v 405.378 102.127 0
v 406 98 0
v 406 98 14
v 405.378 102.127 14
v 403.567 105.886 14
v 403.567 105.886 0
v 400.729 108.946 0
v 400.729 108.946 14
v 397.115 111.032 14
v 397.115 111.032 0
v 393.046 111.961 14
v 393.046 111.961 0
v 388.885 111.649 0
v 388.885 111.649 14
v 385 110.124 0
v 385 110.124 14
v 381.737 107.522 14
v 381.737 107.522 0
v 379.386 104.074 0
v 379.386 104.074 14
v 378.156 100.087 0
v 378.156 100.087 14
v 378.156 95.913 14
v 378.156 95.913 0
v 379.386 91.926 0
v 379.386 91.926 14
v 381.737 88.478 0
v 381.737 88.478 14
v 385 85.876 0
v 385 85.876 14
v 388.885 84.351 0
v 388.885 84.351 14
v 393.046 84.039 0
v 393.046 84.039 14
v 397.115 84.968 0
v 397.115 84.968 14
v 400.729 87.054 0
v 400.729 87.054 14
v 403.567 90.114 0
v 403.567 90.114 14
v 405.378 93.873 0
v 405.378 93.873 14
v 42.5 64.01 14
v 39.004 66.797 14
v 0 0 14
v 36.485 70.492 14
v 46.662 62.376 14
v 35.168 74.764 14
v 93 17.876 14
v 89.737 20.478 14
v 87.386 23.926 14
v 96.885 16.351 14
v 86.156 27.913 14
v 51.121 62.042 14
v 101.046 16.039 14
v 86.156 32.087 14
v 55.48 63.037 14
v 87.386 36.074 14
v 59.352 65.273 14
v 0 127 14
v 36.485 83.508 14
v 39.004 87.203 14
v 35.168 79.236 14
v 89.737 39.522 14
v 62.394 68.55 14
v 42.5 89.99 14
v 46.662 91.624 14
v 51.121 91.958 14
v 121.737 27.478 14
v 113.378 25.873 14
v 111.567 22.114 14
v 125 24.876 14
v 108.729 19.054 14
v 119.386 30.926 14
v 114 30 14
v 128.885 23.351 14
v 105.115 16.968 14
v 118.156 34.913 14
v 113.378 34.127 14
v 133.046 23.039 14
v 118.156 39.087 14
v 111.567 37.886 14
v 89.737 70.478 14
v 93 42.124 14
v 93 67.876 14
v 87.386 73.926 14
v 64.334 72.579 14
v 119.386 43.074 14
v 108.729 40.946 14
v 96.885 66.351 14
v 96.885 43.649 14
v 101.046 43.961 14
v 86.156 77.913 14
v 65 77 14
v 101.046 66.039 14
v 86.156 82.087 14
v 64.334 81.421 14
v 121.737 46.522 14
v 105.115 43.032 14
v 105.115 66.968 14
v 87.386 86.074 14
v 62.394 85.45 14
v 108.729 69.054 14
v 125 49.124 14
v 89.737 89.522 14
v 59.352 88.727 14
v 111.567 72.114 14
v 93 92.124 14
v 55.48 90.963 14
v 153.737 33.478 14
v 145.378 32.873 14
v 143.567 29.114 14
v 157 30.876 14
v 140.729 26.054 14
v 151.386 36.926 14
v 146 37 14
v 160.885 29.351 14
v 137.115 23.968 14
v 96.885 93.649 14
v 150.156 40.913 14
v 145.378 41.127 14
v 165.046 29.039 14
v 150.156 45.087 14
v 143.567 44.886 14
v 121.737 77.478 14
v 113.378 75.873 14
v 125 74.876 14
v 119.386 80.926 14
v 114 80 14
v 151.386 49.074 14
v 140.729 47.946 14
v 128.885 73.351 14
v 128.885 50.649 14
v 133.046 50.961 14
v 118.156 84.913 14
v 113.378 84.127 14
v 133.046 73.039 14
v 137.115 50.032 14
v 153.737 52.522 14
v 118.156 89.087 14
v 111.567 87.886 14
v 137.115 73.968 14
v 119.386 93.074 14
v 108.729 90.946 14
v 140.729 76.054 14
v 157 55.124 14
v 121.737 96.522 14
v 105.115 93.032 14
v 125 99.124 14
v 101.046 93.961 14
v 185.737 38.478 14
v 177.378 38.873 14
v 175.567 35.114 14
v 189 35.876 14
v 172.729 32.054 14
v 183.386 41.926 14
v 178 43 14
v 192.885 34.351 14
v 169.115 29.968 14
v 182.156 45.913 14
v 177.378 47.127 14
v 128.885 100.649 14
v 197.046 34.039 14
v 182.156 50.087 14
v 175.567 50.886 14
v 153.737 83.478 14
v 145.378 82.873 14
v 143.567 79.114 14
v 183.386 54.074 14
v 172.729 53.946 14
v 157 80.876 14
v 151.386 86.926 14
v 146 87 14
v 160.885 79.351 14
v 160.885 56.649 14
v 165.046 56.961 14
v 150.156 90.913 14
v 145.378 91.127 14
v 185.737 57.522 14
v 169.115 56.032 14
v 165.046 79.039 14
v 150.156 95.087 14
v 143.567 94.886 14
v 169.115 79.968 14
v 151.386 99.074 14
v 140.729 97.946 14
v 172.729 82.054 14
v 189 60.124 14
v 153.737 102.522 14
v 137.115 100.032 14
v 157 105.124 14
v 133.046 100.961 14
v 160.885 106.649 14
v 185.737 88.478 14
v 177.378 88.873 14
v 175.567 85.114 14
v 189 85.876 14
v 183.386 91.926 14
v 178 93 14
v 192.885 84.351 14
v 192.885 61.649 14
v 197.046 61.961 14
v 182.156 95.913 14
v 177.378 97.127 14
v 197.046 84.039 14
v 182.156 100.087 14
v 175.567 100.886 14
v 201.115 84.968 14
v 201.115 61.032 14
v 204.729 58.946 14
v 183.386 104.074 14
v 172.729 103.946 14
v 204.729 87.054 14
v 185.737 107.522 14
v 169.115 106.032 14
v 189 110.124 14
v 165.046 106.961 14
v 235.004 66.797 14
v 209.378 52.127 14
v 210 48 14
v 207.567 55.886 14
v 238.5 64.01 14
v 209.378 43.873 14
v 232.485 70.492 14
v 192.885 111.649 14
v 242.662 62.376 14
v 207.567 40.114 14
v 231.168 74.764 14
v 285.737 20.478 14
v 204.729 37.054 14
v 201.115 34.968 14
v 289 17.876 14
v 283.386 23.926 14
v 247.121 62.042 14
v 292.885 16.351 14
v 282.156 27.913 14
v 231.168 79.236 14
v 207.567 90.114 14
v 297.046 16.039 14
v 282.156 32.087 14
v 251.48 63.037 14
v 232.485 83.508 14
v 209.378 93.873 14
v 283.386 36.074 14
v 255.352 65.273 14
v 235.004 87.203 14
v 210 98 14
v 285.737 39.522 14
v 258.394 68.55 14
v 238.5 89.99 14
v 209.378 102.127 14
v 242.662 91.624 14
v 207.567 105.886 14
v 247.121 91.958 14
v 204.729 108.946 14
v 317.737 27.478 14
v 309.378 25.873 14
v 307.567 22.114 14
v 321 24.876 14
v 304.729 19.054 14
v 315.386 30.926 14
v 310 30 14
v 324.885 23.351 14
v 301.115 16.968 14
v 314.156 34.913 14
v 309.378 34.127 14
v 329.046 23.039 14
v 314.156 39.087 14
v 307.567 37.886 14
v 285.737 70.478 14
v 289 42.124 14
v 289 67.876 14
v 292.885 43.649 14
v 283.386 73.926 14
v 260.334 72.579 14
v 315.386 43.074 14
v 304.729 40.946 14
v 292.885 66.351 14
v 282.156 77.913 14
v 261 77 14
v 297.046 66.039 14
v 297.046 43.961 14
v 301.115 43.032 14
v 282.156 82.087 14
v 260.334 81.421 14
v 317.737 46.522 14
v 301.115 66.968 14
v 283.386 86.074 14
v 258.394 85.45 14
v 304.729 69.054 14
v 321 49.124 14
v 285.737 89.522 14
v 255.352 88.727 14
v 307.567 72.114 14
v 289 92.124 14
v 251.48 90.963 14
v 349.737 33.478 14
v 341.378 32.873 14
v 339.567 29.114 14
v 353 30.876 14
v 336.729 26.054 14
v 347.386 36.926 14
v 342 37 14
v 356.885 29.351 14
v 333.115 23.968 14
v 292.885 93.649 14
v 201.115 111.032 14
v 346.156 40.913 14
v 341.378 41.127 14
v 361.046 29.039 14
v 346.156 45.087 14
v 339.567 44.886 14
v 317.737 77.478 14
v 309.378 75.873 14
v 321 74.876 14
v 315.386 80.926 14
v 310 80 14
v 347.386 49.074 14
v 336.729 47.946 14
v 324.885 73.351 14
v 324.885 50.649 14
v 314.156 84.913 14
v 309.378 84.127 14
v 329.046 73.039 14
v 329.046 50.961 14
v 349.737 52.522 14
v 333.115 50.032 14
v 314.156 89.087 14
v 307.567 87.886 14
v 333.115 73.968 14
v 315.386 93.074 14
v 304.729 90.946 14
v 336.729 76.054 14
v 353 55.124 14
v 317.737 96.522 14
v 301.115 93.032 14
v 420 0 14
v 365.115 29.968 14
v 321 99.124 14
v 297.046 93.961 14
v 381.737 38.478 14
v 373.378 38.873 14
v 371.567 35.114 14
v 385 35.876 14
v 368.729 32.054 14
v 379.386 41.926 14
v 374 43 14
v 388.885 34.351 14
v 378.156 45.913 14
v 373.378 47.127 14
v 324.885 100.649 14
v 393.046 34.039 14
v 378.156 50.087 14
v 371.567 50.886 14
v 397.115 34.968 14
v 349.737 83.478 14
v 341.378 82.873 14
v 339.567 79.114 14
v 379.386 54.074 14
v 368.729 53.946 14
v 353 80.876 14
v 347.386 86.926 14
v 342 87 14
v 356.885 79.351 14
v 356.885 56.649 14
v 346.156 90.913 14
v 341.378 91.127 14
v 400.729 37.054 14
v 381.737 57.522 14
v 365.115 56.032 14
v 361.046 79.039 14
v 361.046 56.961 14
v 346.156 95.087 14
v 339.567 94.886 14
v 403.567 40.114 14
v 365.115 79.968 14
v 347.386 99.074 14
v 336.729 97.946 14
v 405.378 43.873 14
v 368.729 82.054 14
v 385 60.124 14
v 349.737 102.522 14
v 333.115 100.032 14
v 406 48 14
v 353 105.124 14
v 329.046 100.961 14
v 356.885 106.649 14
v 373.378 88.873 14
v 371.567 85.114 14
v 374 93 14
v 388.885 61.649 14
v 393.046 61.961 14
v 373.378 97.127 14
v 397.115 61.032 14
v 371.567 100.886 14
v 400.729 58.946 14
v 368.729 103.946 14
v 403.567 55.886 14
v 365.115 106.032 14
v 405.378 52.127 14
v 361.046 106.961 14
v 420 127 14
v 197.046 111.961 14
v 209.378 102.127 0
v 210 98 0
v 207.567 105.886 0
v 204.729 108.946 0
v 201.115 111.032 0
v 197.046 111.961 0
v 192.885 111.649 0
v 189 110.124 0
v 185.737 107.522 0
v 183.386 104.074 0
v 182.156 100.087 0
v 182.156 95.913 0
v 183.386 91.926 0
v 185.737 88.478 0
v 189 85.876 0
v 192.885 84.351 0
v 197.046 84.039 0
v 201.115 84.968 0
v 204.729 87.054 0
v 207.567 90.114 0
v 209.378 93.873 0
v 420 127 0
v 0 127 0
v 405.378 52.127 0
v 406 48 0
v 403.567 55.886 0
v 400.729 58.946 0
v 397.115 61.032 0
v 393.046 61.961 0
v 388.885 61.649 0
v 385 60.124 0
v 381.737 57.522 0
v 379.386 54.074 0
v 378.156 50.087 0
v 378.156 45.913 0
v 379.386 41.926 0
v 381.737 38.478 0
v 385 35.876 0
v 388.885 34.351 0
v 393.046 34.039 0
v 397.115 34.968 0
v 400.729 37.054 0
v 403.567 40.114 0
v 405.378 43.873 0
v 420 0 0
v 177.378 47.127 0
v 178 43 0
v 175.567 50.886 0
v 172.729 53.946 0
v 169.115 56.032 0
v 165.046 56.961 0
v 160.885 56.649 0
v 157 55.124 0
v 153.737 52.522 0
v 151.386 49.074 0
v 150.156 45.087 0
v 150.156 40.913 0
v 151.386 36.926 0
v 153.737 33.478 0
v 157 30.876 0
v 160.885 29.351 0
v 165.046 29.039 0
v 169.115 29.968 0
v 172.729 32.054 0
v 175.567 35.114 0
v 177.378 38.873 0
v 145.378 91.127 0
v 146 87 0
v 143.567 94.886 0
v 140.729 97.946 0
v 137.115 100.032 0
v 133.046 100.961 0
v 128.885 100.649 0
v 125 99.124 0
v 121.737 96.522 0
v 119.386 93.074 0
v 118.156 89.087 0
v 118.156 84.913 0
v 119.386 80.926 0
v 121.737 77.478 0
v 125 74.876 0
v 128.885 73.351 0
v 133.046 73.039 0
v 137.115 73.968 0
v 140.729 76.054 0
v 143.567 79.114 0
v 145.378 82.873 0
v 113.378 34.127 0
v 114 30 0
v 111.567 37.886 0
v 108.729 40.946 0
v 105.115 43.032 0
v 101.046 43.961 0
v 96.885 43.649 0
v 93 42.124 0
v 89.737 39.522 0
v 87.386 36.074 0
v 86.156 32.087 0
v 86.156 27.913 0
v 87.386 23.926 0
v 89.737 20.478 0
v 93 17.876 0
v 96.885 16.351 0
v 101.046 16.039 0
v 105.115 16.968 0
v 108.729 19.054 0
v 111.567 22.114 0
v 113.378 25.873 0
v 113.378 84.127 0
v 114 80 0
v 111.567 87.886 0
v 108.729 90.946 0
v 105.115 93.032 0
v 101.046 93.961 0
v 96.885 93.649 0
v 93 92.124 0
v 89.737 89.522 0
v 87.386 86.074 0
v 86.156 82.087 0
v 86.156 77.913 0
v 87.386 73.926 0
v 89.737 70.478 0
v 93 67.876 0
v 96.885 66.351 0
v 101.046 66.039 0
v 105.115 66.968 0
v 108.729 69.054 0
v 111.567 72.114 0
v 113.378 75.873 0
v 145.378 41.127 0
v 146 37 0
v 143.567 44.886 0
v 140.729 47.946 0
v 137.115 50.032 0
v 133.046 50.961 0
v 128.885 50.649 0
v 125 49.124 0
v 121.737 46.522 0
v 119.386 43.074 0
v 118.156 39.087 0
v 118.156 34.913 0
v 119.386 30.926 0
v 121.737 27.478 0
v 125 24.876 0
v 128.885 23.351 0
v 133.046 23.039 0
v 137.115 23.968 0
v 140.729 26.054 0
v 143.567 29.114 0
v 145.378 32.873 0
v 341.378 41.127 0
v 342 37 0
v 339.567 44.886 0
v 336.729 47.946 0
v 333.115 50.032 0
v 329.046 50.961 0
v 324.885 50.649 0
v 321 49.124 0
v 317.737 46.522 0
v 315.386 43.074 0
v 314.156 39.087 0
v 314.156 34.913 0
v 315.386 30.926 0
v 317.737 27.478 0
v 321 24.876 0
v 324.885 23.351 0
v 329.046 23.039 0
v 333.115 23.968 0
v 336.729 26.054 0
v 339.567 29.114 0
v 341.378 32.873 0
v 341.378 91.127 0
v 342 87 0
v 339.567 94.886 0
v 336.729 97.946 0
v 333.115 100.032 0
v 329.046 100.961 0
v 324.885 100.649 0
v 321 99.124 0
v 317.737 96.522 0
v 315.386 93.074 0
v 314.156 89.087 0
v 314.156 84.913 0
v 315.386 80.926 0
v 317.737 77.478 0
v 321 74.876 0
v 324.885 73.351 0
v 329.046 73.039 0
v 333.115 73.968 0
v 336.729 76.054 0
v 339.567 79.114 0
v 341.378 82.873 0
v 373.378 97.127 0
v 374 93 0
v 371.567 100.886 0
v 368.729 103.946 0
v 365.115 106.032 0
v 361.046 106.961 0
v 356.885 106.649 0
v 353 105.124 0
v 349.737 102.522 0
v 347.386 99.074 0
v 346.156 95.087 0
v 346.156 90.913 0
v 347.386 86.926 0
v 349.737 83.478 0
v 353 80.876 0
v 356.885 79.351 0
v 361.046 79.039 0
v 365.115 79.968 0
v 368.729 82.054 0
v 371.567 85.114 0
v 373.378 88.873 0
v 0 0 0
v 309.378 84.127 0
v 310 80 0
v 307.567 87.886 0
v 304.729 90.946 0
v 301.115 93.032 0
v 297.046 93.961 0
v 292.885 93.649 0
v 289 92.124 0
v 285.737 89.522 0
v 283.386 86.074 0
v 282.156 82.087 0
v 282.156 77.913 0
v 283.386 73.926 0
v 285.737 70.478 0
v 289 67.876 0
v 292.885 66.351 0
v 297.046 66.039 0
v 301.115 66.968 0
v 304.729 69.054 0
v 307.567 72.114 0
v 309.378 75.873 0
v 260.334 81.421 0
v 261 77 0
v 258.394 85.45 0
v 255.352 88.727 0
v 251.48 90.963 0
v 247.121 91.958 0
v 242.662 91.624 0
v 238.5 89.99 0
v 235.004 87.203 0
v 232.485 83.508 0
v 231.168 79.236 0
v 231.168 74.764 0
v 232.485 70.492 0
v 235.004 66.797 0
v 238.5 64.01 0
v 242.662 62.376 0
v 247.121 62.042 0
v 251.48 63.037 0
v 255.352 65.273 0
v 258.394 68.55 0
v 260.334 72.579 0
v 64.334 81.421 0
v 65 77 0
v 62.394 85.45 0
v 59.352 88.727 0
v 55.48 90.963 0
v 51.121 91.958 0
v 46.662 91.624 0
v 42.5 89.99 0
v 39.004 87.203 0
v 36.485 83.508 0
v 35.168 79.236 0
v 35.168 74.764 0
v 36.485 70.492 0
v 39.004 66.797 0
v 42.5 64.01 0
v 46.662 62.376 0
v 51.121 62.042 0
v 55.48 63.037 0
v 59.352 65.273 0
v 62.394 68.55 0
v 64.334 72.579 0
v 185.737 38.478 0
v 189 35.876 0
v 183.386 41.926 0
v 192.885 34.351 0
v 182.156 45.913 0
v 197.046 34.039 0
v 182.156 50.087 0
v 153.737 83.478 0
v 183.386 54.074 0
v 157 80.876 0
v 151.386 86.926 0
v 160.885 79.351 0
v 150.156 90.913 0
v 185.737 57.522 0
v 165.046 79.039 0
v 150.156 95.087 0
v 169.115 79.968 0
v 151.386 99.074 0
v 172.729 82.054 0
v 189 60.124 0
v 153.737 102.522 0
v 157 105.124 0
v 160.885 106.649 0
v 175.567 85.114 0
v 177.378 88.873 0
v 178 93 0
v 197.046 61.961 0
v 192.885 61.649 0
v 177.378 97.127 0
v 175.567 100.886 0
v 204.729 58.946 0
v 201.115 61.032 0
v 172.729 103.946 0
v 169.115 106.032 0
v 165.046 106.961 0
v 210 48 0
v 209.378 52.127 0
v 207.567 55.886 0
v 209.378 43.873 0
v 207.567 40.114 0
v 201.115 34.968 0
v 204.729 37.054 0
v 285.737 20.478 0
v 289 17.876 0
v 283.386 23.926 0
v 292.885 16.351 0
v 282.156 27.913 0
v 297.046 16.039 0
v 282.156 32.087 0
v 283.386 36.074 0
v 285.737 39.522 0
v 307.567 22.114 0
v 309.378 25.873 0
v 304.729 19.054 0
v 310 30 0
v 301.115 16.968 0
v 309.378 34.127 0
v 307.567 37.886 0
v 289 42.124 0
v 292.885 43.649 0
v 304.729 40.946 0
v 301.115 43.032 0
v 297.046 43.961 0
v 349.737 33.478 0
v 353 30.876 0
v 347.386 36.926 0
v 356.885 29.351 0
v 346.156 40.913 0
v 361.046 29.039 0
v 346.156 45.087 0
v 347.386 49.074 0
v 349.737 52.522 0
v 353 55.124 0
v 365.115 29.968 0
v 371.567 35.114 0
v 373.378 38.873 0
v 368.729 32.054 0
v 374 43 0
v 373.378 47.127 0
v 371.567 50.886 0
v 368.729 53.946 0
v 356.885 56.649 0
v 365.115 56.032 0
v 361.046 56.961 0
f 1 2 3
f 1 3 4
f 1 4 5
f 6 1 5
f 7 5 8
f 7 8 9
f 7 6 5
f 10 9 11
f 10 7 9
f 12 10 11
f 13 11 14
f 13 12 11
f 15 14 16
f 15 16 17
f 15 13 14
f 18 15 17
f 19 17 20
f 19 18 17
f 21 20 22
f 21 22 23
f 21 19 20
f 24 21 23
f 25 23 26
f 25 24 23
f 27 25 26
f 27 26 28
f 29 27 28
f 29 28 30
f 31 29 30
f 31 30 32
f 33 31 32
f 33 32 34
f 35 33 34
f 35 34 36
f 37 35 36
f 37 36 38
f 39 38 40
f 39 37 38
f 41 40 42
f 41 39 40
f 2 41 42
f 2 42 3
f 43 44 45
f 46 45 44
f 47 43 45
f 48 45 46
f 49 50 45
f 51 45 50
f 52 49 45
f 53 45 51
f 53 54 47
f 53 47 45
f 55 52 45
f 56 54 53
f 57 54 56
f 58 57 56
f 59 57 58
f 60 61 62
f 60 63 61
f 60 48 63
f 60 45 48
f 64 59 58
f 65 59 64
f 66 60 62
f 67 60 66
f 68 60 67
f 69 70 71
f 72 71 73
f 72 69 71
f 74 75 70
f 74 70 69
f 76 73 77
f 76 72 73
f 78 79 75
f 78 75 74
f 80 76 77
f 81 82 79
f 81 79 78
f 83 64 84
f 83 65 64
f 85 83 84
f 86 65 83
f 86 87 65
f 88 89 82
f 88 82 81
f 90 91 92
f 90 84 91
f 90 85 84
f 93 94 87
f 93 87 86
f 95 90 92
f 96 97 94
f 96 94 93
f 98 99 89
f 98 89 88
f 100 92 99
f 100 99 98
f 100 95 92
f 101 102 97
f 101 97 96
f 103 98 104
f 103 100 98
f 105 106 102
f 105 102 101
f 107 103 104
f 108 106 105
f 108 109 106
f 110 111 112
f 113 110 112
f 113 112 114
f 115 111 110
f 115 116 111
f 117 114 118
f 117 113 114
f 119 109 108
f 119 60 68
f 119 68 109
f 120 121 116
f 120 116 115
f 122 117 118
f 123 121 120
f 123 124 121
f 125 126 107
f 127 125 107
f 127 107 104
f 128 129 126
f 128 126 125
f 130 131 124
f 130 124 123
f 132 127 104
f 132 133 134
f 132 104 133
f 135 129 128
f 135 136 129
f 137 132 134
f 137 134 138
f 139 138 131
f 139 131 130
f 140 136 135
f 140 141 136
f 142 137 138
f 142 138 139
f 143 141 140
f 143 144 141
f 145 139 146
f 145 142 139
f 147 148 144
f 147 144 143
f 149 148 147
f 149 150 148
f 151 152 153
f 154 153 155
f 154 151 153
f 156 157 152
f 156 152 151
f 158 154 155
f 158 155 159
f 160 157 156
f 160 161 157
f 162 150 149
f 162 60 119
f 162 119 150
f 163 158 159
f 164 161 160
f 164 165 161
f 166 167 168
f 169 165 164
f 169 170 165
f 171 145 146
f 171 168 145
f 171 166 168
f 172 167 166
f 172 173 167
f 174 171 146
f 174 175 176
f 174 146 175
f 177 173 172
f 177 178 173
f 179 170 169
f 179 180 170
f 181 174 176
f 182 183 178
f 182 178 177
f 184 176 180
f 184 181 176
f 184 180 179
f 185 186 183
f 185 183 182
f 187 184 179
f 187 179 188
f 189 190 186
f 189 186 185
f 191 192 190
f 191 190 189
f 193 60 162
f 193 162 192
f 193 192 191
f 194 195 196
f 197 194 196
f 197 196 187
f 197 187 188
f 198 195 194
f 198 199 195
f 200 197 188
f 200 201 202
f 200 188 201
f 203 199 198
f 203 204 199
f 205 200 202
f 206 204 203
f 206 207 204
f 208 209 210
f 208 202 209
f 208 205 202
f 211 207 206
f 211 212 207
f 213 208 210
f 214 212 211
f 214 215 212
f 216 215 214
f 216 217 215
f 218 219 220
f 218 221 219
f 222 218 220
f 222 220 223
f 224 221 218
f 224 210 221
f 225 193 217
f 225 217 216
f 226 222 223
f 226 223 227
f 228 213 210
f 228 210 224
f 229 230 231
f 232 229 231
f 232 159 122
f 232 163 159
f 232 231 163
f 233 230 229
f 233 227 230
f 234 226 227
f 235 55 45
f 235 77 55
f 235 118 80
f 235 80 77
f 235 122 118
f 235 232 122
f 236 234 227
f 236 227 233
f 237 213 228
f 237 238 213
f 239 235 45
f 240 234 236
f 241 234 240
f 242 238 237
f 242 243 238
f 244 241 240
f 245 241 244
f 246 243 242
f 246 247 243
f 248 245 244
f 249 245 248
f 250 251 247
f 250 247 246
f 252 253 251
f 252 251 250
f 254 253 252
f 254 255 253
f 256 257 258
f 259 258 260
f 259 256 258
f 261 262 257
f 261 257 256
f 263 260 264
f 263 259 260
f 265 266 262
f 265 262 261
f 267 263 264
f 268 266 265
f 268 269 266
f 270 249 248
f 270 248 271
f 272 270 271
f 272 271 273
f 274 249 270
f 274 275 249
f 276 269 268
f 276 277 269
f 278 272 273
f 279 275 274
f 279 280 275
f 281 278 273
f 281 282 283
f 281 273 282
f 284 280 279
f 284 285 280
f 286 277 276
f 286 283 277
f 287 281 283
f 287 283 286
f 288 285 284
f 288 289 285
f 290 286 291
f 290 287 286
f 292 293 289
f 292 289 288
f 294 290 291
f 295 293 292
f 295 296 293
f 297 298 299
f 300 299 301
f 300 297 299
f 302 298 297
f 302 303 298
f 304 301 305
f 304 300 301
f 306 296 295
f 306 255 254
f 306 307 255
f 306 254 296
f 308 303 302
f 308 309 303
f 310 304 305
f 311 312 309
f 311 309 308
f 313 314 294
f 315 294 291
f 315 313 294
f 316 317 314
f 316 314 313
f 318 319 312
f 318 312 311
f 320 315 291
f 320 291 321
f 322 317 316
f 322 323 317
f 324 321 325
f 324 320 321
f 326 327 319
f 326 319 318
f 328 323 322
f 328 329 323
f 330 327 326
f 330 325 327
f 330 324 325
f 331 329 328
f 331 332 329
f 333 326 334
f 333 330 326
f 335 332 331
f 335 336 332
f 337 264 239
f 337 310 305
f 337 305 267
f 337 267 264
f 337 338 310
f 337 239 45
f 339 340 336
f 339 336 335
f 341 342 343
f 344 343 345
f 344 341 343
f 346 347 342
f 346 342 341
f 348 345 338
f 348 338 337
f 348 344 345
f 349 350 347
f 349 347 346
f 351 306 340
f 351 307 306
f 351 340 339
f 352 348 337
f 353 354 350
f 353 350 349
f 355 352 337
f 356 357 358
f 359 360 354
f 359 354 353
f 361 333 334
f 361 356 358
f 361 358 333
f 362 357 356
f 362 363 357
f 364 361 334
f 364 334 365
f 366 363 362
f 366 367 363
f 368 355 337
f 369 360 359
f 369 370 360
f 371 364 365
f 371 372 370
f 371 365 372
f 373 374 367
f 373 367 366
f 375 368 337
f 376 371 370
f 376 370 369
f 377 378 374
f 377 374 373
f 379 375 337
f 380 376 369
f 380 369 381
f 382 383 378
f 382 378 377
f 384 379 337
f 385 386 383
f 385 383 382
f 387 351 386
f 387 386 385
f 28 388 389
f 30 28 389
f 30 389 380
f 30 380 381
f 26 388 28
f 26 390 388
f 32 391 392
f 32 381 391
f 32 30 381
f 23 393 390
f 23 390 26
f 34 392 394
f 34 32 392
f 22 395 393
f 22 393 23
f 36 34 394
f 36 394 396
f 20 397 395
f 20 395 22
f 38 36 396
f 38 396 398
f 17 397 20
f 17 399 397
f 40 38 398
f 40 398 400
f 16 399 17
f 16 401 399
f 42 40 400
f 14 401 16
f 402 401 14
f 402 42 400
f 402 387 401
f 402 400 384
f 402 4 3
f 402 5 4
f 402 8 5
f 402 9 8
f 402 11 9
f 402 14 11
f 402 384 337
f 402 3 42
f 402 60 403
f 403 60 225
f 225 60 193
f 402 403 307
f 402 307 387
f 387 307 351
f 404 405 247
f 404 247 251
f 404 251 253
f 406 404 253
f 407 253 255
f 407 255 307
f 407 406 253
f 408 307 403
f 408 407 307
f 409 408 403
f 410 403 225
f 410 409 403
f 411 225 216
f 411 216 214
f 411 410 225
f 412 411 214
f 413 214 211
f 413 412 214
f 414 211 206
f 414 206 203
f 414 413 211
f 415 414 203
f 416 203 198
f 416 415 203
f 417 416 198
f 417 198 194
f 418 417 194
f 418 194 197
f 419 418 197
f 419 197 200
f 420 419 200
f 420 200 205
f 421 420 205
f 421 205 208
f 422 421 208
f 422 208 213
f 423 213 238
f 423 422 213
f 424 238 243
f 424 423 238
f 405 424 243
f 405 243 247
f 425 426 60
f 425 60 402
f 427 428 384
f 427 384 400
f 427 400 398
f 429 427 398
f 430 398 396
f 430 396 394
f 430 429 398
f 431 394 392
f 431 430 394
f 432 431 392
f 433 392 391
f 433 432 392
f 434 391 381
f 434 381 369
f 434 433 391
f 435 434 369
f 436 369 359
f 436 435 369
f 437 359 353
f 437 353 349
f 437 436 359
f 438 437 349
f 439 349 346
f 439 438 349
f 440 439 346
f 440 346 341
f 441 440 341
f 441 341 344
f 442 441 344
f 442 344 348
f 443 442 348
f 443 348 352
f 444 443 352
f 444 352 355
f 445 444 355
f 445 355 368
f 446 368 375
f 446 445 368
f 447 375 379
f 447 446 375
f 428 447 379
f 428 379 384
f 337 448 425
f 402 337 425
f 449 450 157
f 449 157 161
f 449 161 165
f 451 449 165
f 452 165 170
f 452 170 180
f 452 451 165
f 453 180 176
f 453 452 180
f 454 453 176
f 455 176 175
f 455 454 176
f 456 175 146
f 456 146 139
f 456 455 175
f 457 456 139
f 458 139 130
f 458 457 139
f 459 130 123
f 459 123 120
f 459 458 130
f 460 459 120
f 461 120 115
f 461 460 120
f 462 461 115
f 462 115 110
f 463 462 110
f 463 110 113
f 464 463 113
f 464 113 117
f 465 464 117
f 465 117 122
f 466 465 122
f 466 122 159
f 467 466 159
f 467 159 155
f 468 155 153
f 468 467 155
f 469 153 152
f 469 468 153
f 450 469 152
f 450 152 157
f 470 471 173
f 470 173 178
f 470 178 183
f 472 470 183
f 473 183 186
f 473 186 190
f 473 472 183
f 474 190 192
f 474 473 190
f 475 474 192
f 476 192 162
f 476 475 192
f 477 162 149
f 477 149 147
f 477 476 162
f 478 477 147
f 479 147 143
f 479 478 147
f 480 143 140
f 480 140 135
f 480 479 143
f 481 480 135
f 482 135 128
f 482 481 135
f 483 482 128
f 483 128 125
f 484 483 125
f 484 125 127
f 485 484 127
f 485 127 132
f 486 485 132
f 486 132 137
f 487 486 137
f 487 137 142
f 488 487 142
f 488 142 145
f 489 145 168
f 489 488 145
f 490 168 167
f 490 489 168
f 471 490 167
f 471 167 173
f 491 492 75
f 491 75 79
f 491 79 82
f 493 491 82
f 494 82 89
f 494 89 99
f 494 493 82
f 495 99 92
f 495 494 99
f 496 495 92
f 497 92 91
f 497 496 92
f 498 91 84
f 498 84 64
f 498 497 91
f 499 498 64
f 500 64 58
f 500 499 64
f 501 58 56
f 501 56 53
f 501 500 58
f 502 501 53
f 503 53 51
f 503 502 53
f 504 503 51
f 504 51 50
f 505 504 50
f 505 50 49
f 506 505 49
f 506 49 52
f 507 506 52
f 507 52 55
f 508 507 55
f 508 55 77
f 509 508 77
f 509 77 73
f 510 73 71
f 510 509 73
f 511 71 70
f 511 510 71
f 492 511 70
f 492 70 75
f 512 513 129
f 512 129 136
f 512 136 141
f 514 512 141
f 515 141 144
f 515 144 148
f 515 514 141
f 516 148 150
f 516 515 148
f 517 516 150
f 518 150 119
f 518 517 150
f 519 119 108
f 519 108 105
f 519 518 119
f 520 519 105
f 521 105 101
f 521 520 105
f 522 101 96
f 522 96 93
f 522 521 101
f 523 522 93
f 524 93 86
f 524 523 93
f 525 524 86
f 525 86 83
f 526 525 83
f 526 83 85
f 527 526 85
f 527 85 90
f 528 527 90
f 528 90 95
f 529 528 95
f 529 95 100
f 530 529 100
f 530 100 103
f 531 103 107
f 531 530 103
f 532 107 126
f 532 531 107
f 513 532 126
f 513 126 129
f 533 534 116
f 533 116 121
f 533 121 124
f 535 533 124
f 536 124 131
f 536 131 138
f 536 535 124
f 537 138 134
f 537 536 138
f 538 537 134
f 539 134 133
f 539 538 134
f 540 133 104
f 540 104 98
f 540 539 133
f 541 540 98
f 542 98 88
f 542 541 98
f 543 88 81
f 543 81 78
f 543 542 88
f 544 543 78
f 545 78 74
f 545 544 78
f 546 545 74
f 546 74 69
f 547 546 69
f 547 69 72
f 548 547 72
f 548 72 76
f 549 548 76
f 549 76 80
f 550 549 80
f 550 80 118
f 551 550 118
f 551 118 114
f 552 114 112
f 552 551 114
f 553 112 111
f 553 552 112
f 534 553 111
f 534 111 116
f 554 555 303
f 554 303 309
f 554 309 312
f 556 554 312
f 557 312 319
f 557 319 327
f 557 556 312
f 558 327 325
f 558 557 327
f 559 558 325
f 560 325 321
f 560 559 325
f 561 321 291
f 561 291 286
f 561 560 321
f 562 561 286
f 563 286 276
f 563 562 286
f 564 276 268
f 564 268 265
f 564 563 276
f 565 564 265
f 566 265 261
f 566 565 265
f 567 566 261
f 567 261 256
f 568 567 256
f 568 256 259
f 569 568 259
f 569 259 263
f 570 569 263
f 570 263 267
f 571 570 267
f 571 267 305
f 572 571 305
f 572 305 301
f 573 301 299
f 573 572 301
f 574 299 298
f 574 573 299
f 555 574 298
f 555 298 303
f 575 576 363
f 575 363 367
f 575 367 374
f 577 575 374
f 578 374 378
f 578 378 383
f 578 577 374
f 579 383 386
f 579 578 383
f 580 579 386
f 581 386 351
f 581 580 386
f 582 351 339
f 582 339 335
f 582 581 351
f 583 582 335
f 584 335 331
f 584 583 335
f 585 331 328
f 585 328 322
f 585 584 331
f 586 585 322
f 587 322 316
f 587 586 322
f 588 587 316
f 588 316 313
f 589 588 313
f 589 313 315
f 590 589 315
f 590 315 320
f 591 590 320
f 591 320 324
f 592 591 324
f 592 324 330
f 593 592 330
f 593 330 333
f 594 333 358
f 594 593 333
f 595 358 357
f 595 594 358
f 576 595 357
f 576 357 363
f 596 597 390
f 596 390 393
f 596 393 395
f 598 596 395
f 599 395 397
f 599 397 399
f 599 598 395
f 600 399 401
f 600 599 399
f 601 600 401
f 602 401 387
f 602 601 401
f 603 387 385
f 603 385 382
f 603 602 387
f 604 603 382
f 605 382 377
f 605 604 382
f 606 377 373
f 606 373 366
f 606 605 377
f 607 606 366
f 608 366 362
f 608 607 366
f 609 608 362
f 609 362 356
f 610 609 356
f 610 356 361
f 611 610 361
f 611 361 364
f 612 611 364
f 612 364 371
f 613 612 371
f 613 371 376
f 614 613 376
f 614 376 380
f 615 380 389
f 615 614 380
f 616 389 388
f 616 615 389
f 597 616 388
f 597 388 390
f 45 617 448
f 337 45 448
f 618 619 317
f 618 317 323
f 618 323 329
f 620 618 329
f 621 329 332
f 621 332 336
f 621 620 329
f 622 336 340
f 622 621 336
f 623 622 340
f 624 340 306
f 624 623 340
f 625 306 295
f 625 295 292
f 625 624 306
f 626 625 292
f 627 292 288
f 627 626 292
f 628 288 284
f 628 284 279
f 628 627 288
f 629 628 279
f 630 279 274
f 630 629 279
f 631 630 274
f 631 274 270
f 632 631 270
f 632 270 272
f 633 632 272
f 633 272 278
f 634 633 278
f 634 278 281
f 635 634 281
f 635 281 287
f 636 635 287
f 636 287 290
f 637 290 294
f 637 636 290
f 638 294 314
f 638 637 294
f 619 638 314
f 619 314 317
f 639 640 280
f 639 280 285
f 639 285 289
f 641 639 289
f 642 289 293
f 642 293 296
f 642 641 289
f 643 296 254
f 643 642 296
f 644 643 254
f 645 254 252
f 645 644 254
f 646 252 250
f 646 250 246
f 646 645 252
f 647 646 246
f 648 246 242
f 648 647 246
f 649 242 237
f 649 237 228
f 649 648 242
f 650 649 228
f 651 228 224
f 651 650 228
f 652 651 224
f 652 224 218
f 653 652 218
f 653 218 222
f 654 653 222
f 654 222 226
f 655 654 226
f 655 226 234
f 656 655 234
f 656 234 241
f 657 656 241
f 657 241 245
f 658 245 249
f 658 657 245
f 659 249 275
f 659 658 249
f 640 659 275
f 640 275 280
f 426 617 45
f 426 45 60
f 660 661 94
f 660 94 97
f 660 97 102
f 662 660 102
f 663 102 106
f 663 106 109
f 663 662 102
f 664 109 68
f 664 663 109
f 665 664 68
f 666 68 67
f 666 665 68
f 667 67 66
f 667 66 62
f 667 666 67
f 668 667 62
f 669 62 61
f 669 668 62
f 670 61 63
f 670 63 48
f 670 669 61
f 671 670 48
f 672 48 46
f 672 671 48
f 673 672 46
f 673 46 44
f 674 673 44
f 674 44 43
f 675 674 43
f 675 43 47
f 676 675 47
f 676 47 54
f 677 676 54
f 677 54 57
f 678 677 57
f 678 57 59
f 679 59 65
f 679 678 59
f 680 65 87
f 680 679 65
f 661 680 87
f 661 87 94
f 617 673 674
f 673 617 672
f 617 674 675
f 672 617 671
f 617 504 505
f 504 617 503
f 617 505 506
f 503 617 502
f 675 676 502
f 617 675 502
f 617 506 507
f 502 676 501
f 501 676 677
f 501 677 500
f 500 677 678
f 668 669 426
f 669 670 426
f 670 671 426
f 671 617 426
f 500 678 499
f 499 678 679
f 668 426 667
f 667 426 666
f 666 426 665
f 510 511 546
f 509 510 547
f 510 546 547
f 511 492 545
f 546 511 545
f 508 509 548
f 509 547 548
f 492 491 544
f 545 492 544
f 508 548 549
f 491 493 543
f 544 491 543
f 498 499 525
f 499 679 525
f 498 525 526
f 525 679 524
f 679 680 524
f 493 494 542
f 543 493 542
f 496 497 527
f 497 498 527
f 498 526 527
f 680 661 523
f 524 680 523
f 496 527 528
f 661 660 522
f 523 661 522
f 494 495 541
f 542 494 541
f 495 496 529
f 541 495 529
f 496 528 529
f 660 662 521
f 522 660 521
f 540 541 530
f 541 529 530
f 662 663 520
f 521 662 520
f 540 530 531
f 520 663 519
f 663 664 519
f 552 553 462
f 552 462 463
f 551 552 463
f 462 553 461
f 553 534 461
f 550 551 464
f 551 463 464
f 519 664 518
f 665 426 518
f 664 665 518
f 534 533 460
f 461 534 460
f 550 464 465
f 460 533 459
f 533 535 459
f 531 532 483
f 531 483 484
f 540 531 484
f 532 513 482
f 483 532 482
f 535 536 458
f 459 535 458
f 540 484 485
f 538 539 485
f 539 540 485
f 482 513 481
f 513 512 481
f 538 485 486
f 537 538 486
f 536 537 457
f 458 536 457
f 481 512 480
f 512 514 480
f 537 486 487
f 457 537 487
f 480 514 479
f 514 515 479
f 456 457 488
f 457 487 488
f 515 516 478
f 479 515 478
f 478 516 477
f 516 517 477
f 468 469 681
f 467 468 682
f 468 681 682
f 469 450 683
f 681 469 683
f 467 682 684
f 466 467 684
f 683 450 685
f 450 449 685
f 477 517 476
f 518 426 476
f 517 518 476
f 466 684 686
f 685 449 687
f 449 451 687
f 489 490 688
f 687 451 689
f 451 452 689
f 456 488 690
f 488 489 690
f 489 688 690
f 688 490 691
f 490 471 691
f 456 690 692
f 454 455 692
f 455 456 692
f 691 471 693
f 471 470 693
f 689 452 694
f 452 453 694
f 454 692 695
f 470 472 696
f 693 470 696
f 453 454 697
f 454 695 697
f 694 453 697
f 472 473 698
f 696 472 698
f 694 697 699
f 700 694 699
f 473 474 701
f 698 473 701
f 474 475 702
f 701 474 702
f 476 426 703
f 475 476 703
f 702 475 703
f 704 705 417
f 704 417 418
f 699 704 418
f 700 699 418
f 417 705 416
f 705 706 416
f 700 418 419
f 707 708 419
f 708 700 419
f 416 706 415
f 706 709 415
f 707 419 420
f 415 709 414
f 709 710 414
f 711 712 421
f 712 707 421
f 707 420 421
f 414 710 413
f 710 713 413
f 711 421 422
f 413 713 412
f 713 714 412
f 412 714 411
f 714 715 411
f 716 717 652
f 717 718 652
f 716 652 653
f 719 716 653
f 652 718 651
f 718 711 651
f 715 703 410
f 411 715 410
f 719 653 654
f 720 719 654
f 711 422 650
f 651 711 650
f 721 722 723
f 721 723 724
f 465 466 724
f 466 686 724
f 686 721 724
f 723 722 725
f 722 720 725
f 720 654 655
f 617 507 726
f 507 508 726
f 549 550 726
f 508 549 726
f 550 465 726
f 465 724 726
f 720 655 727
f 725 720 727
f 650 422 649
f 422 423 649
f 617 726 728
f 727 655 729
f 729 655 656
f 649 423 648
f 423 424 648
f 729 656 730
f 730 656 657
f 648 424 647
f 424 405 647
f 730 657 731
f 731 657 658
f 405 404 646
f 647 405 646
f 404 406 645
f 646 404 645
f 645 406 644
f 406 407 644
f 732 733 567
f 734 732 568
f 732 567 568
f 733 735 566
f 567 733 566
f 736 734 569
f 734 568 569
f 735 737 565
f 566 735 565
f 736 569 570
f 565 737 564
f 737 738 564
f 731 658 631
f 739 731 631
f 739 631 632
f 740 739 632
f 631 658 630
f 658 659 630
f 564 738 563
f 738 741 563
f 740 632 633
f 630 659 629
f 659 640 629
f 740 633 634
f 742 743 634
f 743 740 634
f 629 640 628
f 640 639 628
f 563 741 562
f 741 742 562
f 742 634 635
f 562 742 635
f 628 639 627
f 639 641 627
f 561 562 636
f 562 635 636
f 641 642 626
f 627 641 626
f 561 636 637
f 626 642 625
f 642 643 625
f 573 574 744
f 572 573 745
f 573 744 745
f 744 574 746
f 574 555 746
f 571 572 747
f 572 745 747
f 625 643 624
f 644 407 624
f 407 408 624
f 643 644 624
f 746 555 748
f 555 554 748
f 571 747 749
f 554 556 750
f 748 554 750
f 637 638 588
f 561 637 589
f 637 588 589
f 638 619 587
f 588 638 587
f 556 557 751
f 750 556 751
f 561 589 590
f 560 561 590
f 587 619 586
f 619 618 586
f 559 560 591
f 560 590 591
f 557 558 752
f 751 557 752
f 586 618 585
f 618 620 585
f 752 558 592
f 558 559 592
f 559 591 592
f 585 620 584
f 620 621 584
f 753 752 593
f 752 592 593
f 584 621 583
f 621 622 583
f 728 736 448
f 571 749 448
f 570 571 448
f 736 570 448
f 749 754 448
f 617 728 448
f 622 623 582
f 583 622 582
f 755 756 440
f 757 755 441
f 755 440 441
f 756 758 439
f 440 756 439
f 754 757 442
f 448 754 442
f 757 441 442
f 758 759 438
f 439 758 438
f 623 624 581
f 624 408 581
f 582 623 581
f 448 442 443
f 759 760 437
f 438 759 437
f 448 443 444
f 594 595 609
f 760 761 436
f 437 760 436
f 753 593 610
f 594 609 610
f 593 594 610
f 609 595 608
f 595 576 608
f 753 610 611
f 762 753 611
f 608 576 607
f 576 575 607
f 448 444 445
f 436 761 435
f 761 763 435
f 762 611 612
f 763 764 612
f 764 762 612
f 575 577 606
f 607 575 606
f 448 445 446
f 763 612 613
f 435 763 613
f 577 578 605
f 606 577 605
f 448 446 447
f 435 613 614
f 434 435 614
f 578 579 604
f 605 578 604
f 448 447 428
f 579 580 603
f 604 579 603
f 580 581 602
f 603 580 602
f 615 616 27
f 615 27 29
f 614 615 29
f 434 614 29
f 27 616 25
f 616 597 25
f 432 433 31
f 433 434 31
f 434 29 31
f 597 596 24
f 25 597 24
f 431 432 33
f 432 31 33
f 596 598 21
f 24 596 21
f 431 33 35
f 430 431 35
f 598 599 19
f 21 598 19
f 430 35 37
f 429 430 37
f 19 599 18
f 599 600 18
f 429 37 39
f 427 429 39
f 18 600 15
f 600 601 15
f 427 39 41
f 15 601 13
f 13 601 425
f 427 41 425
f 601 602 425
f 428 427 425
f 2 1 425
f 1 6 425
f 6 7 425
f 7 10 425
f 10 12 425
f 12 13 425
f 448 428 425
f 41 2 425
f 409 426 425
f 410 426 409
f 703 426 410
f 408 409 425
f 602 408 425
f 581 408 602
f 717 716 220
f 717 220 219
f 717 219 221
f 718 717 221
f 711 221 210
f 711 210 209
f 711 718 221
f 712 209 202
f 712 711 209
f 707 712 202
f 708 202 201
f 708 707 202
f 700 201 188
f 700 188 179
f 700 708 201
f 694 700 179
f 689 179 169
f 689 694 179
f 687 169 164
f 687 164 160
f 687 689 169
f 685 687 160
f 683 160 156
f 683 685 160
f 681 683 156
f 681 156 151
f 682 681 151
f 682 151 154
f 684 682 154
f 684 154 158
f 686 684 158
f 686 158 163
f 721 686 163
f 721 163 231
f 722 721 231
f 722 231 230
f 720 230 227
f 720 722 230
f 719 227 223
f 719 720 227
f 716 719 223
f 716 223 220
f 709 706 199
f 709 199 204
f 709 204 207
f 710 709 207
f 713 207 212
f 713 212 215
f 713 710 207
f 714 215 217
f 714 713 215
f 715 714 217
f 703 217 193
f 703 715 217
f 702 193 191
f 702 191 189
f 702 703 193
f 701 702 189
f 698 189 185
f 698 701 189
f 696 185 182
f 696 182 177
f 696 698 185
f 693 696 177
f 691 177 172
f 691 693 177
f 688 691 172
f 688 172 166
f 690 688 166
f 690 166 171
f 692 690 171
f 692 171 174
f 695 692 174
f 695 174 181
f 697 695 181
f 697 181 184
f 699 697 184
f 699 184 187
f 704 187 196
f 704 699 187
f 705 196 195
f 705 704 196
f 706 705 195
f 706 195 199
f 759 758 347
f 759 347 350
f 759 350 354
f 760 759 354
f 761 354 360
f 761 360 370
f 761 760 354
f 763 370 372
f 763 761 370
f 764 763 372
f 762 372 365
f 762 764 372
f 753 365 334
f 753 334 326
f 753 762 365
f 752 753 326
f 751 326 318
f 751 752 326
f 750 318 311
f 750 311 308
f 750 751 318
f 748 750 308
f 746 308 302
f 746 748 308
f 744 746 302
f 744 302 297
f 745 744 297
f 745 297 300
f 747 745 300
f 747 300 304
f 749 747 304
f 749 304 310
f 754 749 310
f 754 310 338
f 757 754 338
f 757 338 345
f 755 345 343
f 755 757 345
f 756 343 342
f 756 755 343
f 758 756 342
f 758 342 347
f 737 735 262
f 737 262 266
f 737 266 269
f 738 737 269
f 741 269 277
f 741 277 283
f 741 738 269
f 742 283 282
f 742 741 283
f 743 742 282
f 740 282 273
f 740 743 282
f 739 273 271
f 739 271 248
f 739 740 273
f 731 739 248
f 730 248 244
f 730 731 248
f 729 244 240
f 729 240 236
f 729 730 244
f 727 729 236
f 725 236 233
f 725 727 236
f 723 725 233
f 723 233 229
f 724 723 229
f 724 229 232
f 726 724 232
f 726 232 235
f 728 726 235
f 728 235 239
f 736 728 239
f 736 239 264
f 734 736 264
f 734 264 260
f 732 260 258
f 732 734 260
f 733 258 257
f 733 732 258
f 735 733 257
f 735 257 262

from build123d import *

# Parameters (mm, degrees)
SKETCH_W   = 420
SKETCH_H   = 127
SKETCH_R   = 15
SKETCH_R_2 = 14
PAD_DEPTH  = 14


with BuildPart() as part:
    # Sketch → Pad (new body)
    with BuildSketch(Plane.XY):
        with Locations((210, 63.5)):
            Rectangle(SKETCH_W, SKETCH_H)
        with Locations((50, 77)):
            Circle(SKETCH_R, mode=Mode.SUBTRACT)
        with Locations((100, 80)):
            Circle(SKETCH_R_2, mode=Mode.SUBTRACT)
        with Locations((132, 87)):
            Circle(SKETCH_R_2, mode=Mode.SUBTRACT)
        with Locations((164, 93)):
            Circle(SKETCH_R_2, mode=Mode.SUBTRACT)
        with Locations((196, 98)):
            Circle(SKETCH_R_2, mode=Mode.SUBTRACT)
        with Locations((100, 30)):
            Circle(SKETCH_R_2, mode=Mode.SUBTRACT)
        with Locations((132, 37)):
            Circle(SKETCH_R_2, mode=Mode.SUBTRACT)
        with Locations((164, 43)):
            Circle(SKETCH_R_2, mode=Mode.SUBTRACT)
        with Locations((196, 48)):
            Circle(SKETCH_R_2, mode=Mode.SUBTRACT)
        with Locations((246, 77)):
            Circle(SKETCH_R, mode=Mode.SUBTRACT)
        with Locations((296, 80)):
            Circle(SKETCH_R_2, mode=Mode.SUBTRACT)
        with Locations((328, 87)):
            Circle(SKETCH_R_2, mode=Mode.SUBTRACT)
        with Locations((360, 93)):
            Circle(SKETCH_R_2, mode=Mode.SUBTRACT)
        with Locations((392, 98)):
            Circle(SKETCH_R_2, mode=Mode.SUBTRACT)
        with Locations((392, 48)):
            Circle(SKETCH_R_2, mode=Mode.SUBTRACT)
        with Locations((360, 43)):
            Circle(SKETCH_R_2, mode=Mode.SUBTRACT)
        with Locations((328, 37)):
            Circle(SKETCH_R_2, mode=Mode.SUBTRACT)
        with Locations((296, 30)):
            Circle(SKETCH_R_2, mode=Mode.SUBTRACT)
    extrude(amount=PAD_DEPTH)


solid = part.part
